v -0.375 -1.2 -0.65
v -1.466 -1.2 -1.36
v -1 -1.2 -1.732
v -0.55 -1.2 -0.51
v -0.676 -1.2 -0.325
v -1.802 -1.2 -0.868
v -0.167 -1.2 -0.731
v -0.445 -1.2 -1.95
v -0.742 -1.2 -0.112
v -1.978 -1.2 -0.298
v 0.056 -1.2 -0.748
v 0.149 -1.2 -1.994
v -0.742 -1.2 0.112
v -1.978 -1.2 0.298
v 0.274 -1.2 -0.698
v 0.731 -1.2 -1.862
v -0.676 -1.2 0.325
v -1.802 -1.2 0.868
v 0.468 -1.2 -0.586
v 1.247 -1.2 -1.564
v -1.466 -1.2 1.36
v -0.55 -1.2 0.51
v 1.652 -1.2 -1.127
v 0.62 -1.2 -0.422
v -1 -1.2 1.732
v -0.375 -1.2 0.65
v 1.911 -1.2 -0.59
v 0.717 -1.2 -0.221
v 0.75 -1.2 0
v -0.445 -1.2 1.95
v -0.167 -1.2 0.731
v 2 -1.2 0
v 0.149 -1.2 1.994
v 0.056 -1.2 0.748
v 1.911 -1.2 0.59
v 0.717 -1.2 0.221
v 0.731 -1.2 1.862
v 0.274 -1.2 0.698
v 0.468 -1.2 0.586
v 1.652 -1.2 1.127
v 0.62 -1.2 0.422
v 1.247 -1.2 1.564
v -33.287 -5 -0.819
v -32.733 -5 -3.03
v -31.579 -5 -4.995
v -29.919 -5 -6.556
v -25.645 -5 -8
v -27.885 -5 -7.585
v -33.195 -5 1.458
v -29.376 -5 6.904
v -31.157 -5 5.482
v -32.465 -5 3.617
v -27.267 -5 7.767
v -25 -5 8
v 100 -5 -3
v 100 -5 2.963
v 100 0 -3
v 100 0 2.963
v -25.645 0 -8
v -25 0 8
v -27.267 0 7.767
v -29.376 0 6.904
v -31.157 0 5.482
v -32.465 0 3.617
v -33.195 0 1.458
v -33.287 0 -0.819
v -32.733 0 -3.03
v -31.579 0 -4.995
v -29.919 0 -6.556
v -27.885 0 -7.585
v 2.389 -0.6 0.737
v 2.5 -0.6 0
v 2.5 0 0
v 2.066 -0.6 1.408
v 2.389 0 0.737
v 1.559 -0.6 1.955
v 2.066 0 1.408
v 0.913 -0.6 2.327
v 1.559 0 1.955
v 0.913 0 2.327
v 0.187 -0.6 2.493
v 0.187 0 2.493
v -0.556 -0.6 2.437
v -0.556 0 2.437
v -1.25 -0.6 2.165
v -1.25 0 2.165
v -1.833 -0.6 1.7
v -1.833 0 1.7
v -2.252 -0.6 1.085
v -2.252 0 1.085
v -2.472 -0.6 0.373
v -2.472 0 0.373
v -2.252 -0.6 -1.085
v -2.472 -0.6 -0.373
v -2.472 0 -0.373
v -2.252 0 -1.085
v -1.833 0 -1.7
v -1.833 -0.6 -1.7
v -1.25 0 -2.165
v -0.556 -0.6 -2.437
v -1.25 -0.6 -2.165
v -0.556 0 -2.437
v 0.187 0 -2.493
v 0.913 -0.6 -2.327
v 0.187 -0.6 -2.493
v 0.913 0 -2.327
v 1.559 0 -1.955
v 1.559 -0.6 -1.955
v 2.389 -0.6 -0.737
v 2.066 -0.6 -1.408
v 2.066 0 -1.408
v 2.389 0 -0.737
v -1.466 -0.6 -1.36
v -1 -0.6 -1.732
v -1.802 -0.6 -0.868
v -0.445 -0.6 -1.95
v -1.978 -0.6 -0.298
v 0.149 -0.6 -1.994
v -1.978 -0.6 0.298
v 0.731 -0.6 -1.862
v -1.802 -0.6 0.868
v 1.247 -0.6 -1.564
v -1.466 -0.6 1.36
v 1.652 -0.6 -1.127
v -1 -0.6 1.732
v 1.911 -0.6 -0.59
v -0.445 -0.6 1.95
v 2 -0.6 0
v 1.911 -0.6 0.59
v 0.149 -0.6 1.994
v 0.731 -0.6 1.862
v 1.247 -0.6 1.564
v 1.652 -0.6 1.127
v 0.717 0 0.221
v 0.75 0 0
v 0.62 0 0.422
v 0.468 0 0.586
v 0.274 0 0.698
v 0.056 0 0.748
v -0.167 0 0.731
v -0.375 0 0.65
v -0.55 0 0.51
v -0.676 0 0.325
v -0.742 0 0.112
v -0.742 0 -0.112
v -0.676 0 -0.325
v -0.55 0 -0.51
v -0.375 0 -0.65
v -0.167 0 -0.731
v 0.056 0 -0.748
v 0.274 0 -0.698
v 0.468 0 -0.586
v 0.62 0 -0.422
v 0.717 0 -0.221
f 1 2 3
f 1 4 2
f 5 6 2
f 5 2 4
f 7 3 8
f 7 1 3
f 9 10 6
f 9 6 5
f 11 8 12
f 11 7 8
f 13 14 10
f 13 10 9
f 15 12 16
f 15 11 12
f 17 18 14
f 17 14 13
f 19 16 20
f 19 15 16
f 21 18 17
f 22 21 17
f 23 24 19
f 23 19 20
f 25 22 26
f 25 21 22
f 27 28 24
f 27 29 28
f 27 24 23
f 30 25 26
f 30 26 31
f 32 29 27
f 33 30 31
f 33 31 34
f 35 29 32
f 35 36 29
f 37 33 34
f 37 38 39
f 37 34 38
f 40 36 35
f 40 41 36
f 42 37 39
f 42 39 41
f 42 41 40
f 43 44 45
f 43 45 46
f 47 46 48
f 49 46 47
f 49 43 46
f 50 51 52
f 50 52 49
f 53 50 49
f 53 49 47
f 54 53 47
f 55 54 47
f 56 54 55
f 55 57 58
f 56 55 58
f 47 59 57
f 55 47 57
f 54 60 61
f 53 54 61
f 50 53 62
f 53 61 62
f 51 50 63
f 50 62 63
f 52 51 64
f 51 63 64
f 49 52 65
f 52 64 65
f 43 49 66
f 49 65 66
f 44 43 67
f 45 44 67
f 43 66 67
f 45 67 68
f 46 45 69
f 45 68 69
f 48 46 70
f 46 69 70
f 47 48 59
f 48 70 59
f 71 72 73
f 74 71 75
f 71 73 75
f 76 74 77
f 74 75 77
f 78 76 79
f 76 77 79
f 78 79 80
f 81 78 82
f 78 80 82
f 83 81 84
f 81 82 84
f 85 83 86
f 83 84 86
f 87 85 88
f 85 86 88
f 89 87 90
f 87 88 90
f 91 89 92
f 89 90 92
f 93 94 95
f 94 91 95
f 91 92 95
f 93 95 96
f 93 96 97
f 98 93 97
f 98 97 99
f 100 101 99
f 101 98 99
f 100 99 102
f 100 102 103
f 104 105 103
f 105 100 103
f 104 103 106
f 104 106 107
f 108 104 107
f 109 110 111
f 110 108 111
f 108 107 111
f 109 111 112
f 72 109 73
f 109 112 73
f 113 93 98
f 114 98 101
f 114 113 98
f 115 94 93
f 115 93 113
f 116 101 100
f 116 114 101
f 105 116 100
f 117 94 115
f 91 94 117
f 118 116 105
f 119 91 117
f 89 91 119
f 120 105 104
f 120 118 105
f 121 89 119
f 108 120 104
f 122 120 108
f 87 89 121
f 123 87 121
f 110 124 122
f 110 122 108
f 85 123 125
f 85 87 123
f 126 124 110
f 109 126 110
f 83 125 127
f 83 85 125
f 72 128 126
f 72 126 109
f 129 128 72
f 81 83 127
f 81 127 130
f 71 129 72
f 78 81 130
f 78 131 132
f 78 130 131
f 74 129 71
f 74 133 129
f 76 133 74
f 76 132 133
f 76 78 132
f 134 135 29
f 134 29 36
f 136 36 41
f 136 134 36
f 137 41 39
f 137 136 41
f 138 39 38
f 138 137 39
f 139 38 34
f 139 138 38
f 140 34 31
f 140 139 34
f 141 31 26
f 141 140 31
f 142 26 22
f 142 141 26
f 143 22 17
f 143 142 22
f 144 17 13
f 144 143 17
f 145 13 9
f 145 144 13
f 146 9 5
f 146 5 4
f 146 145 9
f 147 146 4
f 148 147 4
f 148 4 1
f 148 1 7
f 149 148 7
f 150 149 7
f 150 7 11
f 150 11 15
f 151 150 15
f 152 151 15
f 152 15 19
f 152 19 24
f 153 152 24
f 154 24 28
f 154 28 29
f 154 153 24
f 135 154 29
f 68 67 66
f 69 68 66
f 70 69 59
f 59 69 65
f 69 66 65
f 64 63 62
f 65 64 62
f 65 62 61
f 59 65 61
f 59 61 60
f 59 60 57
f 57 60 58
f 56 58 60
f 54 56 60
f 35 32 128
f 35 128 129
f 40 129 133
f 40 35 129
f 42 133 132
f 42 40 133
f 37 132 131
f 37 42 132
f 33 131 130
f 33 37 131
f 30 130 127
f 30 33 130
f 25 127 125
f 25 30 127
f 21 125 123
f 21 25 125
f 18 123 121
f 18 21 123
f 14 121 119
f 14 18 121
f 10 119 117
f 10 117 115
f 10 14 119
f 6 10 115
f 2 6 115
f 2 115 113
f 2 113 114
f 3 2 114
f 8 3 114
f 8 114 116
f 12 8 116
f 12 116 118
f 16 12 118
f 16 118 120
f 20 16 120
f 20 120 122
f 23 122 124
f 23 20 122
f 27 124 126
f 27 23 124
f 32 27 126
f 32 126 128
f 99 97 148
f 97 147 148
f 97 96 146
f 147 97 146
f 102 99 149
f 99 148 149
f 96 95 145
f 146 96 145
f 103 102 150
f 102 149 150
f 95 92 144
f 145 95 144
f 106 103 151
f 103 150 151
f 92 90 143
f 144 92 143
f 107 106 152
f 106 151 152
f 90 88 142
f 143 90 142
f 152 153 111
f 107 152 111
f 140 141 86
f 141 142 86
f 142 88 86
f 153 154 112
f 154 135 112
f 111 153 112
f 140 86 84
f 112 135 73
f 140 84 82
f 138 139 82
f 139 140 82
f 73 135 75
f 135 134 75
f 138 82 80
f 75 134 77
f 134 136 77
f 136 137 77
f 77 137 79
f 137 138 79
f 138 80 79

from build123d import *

# Parameters (mm, degrees)
F0_R     = 2.5
F0_R_2   = 0.75
F1_DEPTH = 1.2
F2_R     = 4.21648
F2_R_2   = 2.5
F2_R_3   = 2
F3_DEPTH = 0.6
F6_DEPTH = 5


with BuildPart() as f1:
    # F0 (on Front) → F1 (new body)
    with BuildSketch(Plane.XZ):
        Circle(F0_R)
        Circle(F0_R_2, mode=Mode.SUBTRACT)
    extrude(amount=F1_DEPTH)

    # F2 (on face) → F3 (cut)
    with BuildSketch(Plane.XZ.offset(1.2)):
        Circle(F2_R)
        Circle(F2_R_2, mode=Mode.SUBTRACT)
        Circle(F2_R_2)
        Circle(F2_R_3, mode=Mode.SUBTRACT)
    extrude(amount=-F3_DEPTH, mode=Mode.SUBTRACT)


with BuildPart() as f4_1:
    # F4: copy of F1
    add(f1.part)


with BuildPart() as f6:
    # F5 (on Front) → F6 (new body)
    with BuildSketch(Plane.XZ):
        with BuildLine():
            Line((100, 2.963339), (-25, 8))
            ThreePointArc((-25, 8), (-33.322346, 0.322346), (-25.644693, -8))
            Line((-25.644693, -8), (100, -3))
            Line((100, -3), (100, 2.963339))
        make_face()
    extrude(amount=F6_DEPTH)


solid = Compound([f1.part, f6.part])
